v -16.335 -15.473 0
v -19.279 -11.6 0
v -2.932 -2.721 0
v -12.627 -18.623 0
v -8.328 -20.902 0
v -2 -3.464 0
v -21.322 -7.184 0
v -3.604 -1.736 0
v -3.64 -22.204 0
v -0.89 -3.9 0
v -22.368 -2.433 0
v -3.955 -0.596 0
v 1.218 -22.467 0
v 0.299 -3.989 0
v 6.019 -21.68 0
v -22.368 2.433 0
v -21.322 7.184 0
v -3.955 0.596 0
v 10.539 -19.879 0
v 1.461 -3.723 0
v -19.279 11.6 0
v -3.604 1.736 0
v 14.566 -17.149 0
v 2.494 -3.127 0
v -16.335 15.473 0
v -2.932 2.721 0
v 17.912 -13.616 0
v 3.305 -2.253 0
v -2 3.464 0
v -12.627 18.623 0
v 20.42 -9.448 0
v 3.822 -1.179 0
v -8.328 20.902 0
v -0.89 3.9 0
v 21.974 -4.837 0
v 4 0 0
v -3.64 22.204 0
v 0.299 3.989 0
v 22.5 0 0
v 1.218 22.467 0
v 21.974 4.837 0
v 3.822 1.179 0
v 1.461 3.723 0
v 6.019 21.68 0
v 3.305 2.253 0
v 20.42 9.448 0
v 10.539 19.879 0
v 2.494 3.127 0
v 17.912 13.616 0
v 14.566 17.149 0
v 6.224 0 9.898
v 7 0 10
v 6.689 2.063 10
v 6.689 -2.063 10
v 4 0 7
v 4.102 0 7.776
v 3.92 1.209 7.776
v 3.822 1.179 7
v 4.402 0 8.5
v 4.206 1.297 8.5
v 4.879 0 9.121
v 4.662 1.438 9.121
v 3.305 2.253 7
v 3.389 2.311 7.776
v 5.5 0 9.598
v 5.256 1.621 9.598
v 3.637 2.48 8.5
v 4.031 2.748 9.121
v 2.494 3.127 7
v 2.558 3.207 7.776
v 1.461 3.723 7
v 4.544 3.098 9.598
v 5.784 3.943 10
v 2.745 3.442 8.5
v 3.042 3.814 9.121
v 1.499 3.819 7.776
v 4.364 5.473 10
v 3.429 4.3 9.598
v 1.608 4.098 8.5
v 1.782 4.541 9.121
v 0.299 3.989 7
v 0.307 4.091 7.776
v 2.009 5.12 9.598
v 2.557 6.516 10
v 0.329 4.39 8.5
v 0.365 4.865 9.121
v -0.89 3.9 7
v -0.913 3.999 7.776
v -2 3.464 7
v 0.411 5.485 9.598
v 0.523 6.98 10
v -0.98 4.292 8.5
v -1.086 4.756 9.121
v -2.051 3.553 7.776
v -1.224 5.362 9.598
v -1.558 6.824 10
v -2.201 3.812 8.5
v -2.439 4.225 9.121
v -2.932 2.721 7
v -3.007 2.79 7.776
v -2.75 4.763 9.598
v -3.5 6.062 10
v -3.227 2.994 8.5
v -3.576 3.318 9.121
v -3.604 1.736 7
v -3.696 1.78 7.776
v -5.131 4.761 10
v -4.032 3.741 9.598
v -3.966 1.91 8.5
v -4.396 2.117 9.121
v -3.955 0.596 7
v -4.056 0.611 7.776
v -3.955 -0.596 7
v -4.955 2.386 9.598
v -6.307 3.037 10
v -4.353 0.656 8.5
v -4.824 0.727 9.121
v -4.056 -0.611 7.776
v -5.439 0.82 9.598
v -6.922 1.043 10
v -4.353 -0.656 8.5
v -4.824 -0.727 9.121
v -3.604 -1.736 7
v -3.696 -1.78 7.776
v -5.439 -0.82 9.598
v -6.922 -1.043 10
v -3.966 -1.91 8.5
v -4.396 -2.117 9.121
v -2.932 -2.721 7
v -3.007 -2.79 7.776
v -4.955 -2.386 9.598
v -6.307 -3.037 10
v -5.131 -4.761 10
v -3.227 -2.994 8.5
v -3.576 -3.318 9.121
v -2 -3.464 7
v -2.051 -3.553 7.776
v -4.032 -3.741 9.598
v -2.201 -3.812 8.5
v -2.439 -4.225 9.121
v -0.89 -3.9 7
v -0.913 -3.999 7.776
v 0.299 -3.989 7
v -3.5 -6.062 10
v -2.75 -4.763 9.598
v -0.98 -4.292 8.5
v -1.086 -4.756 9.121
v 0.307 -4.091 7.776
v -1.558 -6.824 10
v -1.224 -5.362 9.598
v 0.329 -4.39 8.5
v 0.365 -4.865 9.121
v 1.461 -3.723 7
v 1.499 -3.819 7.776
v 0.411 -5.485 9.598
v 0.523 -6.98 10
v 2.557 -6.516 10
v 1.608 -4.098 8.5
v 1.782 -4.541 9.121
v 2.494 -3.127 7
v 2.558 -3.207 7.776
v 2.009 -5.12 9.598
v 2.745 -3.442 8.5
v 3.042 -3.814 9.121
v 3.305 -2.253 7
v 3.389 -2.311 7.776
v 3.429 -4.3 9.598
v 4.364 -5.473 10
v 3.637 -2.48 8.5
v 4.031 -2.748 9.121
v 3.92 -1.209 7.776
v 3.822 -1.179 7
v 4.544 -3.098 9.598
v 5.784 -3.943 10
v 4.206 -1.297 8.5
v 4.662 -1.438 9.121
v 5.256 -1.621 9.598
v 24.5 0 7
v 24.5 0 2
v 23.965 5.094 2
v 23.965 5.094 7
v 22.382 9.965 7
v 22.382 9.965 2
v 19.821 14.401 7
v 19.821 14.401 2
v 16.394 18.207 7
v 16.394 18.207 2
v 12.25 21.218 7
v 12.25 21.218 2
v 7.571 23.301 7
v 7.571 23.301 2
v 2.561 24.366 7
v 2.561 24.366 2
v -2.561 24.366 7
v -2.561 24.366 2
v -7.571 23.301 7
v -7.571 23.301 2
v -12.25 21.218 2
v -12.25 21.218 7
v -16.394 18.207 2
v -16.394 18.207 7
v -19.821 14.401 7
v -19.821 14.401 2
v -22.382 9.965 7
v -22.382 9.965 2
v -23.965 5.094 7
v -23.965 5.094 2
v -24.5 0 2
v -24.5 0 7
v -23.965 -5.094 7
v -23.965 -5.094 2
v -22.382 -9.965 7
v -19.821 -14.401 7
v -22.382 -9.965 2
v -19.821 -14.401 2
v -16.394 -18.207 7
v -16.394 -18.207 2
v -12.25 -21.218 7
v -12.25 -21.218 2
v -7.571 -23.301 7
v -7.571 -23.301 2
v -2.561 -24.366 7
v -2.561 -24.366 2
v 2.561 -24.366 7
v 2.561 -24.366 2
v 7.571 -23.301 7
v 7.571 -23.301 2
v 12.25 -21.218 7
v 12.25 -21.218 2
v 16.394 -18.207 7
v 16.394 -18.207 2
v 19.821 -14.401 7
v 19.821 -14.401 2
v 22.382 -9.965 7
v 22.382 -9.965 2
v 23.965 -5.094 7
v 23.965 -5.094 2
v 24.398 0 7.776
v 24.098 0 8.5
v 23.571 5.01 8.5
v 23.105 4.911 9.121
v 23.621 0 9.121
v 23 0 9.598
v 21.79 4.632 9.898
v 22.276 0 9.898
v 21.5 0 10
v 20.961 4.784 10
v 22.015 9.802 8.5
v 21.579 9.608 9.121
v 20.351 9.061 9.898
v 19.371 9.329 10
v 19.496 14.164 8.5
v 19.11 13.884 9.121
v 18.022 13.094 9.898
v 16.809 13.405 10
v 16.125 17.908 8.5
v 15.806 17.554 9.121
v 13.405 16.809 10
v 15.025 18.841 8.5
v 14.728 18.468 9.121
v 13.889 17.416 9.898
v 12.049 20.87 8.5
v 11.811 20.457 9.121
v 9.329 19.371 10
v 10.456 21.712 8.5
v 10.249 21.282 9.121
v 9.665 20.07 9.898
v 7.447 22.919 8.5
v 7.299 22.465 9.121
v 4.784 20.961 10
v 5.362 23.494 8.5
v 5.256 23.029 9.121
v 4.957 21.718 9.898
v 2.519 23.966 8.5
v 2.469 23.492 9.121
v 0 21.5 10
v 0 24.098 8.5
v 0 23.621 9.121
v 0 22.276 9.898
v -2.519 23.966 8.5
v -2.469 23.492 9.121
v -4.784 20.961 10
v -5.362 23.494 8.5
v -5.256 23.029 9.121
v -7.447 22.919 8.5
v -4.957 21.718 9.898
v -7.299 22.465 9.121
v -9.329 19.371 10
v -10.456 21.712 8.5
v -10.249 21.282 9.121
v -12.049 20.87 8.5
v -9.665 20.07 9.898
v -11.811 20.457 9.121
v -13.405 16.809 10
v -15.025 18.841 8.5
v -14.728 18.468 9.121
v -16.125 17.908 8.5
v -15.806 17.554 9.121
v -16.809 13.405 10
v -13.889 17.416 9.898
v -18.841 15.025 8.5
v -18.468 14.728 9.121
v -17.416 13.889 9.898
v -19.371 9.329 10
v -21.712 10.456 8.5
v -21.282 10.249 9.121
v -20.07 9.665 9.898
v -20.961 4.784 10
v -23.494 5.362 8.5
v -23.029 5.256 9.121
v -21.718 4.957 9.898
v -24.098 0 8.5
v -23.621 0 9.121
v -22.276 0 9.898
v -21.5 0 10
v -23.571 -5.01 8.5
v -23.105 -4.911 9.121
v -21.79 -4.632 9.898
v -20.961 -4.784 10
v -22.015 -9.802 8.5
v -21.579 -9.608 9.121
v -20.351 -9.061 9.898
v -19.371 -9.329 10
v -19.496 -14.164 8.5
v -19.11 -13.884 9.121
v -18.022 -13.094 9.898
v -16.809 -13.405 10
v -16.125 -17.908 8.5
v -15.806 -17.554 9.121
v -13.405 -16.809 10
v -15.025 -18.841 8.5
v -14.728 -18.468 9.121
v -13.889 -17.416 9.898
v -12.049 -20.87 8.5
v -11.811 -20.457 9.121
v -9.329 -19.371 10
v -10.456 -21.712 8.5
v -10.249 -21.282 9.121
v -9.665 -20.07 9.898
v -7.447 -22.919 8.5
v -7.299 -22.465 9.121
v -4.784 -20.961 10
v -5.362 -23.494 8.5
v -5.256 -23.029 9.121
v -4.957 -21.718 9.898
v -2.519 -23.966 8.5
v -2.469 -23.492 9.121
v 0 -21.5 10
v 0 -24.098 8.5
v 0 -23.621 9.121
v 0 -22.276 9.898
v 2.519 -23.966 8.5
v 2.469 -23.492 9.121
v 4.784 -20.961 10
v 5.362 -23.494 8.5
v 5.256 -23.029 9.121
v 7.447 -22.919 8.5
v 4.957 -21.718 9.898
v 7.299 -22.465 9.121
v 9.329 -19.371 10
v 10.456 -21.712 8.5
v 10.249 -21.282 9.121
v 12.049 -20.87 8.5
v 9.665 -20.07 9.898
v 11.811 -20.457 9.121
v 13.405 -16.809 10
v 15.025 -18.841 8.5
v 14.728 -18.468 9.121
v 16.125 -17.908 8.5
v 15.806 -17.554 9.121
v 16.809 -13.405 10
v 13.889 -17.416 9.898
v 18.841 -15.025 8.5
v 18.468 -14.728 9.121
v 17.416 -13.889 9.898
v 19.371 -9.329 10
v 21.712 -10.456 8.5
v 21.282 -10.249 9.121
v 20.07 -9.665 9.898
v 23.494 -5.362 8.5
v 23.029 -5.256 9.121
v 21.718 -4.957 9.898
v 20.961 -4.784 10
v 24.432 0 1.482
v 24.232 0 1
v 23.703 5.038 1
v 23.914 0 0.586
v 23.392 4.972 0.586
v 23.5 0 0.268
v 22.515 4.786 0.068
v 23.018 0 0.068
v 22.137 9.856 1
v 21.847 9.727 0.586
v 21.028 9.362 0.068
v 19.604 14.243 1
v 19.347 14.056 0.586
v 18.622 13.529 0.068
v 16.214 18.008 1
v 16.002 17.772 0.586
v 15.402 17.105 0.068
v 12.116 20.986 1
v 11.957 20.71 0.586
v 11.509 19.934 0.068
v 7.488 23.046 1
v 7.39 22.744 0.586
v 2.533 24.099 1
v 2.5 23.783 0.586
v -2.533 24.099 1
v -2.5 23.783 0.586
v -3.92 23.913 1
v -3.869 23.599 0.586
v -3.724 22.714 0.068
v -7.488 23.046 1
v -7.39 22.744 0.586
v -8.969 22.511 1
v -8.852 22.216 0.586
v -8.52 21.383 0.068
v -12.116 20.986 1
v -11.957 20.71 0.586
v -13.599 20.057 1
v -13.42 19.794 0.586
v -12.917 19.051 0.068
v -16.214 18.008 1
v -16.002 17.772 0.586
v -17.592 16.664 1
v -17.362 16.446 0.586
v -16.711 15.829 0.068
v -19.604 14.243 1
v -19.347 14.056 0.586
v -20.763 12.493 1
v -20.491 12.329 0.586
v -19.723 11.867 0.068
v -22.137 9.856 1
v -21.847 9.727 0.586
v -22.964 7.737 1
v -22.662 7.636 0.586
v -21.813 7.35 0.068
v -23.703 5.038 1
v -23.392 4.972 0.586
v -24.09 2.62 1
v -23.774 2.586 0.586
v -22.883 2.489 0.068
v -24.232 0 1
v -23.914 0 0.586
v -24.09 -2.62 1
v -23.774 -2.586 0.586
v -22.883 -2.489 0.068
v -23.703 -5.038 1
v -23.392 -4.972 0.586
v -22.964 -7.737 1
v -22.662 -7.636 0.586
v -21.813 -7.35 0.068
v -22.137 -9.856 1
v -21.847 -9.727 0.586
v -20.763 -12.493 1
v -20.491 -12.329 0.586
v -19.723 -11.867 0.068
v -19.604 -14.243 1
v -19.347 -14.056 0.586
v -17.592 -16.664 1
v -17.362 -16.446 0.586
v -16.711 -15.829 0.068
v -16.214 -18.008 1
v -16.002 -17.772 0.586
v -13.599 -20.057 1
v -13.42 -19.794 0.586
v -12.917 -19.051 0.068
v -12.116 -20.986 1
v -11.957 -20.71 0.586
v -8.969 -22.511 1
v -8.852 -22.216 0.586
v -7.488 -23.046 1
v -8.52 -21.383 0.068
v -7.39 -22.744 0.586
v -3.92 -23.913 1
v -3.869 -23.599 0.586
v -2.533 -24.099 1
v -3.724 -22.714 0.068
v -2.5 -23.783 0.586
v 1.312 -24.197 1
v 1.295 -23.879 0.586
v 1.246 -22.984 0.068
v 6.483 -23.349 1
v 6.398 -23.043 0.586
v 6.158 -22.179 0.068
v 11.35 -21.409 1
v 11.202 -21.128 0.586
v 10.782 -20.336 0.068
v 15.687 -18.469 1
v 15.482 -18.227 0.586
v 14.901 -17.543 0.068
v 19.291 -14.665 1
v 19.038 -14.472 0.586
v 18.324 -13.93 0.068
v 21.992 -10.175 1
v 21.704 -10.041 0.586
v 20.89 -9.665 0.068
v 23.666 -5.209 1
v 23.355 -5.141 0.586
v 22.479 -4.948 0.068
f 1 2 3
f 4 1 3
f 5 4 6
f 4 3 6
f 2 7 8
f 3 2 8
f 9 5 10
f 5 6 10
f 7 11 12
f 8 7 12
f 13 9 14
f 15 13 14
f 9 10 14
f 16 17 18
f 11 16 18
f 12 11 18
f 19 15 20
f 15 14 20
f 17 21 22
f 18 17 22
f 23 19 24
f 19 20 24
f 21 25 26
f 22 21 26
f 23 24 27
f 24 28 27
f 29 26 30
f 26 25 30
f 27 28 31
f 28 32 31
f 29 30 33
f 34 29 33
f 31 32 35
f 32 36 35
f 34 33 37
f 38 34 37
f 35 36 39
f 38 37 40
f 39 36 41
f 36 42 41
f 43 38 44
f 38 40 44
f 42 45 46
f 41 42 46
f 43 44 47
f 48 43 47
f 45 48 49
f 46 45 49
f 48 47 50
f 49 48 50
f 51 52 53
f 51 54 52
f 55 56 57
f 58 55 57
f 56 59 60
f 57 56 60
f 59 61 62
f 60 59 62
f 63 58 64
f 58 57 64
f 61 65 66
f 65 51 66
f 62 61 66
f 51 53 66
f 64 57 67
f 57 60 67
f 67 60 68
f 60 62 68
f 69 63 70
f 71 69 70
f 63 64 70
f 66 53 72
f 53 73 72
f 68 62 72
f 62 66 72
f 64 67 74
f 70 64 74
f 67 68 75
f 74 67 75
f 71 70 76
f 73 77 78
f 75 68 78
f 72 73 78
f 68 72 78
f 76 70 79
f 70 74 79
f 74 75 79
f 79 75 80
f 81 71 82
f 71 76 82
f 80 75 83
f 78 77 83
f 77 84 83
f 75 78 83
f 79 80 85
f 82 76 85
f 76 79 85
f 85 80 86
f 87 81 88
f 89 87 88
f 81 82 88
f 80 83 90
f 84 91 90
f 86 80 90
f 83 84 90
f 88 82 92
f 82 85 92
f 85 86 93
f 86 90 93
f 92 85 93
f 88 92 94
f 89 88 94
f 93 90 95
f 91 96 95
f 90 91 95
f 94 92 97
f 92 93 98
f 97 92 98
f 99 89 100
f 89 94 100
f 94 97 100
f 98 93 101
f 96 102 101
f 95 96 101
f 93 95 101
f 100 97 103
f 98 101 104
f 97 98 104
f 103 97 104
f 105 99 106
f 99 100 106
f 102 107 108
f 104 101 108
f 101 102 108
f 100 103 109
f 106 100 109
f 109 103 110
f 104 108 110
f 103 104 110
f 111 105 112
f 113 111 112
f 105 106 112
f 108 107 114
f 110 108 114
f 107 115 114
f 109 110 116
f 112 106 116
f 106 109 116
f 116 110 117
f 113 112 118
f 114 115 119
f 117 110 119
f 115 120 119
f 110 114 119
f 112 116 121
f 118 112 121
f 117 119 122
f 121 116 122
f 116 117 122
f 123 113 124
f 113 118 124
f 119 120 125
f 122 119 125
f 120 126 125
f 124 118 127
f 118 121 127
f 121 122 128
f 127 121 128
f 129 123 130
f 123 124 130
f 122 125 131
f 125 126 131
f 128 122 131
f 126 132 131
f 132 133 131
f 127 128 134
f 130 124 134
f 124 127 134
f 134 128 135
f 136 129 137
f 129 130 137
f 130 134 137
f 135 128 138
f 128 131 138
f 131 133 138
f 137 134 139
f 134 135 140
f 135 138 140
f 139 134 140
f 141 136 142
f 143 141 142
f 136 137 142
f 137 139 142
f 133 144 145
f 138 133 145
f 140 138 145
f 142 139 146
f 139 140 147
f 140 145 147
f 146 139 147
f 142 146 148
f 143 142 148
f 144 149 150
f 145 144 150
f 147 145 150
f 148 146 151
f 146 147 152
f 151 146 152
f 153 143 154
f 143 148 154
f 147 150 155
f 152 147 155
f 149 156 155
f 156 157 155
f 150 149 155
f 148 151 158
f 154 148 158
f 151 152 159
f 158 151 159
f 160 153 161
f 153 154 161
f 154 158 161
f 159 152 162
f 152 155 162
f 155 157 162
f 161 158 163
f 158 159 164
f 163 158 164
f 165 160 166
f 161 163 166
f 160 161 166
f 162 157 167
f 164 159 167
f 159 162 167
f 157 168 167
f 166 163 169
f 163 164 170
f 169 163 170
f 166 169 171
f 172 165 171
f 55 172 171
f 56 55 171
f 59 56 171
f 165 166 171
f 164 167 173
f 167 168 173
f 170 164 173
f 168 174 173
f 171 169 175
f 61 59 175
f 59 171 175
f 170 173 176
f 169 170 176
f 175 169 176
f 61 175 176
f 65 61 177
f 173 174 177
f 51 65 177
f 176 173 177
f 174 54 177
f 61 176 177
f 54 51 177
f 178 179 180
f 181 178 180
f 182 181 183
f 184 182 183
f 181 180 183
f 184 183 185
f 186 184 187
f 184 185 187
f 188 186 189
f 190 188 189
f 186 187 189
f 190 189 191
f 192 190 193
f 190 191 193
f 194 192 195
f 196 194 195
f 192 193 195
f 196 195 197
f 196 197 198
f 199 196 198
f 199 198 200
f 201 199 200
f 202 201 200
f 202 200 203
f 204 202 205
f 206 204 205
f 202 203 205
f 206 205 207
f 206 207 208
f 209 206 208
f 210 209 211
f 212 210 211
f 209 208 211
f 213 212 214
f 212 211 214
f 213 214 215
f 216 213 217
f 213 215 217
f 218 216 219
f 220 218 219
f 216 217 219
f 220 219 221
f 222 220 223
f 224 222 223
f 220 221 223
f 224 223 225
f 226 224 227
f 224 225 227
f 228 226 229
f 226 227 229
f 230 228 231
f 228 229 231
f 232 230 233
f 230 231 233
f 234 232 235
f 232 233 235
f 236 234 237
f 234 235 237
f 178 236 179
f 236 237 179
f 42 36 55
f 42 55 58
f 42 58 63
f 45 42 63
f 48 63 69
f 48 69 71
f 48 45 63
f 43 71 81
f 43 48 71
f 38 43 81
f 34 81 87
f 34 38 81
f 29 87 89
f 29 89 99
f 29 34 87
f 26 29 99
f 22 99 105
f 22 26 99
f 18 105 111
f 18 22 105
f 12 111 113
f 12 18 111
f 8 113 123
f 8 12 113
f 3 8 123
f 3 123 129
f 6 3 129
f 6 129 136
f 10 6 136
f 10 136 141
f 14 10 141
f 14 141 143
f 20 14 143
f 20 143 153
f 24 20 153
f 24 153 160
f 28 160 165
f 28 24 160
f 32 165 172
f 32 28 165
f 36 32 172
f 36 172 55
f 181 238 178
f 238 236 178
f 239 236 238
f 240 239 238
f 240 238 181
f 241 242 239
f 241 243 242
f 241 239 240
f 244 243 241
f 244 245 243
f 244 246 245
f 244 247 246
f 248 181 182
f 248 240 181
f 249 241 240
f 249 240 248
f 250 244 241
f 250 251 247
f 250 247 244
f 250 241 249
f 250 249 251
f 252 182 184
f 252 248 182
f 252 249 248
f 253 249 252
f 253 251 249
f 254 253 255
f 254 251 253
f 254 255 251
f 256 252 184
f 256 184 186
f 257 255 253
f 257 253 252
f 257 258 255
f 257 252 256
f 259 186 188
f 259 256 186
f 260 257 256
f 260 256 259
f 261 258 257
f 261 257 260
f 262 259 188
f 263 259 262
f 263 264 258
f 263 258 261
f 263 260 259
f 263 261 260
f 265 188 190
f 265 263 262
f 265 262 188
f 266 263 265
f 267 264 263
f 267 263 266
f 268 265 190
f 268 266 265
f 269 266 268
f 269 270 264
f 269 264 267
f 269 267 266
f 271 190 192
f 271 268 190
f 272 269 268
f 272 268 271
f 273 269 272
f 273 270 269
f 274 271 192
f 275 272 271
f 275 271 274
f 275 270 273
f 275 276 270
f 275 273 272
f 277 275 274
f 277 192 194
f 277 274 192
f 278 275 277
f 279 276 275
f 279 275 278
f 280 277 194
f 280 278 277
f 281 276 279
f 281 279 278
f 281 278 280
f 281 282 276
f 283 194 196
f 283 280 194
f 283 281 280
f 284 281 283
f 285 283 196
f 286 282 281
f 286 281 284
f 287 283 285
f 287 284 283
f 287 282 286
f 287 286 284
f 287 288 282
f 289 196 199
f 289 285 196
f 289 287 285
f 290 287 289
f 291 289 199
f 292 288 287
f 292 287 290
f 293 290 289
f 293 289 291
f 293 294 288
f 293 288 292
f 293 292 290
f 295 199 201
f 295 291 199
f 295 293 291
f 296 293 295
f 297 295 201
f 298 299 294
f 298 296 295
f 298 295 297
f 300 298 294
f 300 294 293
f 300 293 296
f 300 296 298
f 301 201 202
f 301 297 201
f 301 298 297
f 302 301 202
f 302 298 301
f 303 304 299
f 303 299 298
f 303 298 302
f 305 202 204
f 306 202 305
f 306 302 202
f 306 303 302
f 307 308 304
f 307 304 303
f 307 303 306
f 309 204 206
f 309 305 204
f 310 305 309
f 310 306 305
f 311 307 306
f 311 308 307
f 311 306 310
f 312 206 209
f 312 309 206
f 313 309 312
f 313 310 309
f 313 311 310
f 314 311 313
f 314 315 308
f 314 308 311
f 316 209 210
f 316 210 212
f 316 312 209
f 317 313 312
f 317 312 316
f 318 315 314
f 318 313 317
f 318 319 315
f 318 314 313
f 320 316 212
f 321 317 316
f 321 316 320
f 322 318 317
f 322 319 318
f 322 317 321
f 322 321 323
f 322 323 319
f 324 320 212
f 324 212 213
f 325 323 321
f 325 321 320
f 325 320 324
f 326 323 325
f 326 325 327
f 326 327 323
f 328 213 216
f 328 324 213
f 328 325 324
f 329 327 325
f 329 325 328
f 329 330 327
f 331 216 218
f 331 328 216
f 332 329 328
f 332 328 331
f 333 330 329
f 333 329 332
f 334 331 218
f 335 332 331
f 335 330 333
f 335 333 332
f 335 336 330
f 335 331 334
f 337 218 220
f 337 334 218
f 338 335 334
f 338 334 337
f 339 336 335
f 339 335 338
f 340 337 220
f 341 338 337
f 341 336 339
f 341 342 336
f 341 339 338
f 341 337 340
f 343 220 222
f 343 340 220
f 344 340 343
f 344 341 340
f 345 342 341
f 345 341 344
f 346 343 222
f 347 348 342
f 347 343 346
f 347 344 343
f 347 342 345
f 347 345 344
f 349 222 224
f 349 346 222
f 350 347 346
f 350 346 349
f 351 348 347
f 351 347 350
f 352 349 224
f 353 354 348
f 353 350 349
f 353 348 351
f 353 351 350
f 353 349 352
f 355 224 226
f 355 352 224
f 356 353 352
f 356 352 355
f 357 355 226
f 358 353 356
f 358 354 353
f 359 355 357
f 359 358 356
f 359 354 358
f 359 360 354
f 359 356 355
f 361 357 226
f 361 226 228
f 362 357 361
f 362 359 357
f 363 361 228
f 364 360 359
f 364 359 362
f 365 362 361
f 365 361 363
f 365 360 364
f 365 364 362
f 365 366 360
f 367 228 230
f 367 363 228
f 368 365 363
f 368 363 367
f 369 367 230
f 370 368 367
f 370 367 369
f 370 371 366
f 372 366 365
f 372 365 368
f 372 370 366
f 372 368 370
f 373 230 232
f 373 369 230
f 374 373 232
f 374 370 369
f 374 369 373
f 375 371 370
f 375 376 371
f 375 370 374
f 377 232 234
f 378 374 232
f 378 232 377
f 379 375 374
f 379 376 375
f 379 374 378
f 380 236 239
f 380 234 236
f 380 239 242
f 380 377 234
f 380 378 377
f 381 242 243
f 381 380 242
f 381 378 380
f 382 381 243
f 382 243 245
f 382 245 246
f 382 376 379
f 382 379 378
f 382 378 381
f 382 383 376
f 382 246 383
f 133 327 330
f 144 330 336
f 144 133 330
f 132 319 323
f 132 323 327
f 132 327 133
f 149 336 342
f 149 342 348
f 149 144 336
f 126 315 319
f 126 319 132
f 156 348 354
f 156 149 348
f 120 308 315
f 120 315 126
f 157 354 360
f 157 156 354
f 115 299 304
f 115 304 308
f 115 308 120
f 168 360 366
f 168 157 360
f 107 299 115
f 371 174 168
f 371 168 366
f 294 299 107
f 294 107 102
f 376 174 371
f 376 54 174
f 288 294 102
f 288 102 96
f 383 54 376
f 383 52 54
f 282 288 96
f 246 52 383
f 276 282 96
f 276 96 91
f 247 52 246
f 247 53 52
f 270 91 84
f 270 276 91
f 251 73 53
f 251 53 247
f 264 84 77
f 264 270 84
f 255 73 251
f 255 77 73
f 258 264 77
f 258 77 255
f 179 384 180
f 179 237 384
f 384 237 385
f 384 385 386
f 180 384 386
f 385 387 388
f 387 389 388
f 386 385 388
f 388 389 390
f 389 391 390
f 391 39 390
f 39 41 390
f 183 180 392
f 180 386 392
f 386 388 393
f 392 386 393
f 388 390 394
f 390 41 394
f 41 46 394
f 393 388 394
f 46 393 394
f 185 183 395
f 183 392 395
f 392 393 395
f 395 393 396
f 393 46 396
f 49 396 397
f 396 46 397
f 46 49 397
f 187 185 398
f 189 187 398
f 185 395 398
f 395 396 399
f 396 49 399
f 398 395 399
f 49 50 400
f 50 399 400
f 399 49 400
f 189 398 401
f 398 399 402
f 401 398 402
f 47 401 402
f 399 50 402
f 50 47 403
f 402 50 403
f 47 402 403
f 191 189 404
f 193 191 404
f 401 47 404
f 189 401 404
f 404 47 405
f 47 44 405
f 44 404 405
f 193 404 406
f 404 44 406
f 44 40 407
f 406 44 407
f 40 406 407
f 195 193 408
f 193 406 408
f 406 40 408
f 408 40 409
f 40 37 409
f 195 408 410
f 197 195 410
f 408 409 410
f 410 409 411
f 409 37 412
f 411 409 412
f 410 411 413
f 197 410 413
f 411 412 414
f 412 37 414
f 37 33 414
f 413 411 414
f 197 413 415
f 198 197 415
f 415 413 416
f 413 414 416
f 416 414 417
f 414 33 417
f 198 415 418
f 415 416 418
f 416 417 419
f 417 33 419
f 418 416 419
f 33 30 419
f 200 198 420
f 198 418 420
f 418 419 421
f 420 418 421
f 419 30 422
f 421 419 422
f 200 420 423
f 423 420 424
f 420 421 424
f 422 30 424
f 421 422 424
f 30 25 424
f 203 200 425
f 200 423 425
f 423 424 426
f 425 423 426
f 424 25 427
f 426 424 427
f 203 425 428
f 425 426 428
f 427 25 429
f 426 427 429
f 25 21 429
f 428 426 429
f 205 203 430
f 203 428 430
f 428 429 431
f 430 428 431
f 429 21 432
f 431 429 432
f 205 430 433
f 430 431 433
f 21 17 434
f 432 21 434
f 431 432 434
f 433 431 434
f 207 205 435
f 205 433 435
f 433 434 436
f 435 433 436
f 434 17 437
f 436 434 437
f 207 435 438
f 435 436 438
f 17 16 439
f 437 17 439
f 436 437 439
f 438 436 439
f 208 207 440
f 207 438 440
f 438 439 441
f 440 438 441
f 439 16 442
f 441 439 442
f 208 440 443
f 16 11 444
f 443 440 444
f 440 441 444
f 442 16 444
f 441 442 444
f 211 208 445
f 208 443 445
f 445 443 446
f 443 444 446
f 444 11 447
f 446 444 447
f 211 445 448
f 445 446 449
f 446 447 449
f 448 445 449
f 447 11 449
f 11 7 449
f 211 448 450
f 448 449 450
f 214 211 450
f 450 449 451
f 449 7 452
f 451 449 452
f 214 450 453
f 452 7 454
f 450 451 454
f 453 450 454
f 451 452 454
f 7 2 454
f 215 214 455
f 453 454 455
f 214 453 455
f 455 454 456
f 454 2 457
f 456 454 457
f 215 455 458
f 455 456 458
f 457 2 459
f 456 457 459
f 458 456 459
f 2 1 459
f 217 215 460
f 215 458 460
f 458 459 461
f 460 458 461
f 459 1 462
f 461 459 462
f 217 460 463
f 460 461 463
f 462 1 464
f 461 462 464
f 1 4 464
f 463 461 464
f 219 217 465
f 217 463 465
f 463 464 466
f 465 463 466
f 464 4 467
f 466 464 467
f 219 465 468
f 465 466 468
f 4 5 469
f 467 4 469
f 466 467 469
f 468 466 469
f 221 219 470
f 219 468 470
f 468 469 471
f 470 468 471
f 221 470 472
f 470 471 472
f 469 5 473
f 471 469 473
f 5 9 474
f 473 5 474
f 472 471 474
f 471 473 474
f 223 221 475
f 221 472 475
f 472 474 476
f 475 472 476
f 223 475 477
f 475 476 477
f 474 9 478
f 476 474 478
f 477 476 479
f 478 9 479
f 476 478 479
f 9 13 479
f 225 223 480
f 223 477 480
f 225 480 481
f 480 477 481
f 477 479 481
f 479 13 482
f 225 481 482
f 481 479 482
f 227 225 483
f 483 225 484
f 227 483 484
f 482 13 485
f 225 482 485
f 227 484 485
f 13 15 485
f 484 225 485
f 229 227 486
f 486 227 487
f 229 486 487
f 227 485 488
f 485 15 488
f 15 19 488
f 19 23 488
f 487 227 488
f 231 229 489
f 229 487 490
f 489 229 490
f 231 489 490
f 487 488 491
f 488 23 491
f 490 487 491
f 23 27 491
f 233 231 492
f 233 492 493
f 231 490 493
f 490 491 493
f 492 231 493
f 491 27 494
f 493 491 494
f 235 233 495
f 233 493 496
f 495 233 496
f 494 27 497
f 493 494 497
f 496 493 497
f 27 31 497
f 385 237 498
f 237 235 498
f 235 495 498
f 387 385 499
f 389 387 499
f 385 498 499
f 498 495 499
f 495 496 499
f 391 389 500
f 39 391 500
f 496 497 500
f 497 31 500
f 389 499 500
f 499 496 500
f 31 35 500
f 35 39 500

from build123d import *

# Parameters (mm, degrees)
F0_R     = 24.5
F0_R_2   = 4
F1_DEPTH = 10
F2_R     = 3
F3_R     = 2


with BuildPart() as f1:
    # F0 (on Top) → F1 (new body)
    with BuildSketch(Plane.XY):
        Circle(F0_R)
        Circle(F0_R_2, mode=Mode.SUBTRACT)
    extrude(amount=F1_DEPTH)

    # F2
    f2_edges = [f1.edges().sort_by_distance(p)[0] for p in [
        (-24.5, 0, 10),
        (-4, 0, 10),
    ]]
    fillet(f2_edges, radius=F2_R)

    # F3
    f3_edges = [f1.edges().sort_by_distance(p)[0] for p in [
        (-24.5, 0, 0),
    ]]
    fillet(f3_edges, radius=F3_R)


solid = f1.part
